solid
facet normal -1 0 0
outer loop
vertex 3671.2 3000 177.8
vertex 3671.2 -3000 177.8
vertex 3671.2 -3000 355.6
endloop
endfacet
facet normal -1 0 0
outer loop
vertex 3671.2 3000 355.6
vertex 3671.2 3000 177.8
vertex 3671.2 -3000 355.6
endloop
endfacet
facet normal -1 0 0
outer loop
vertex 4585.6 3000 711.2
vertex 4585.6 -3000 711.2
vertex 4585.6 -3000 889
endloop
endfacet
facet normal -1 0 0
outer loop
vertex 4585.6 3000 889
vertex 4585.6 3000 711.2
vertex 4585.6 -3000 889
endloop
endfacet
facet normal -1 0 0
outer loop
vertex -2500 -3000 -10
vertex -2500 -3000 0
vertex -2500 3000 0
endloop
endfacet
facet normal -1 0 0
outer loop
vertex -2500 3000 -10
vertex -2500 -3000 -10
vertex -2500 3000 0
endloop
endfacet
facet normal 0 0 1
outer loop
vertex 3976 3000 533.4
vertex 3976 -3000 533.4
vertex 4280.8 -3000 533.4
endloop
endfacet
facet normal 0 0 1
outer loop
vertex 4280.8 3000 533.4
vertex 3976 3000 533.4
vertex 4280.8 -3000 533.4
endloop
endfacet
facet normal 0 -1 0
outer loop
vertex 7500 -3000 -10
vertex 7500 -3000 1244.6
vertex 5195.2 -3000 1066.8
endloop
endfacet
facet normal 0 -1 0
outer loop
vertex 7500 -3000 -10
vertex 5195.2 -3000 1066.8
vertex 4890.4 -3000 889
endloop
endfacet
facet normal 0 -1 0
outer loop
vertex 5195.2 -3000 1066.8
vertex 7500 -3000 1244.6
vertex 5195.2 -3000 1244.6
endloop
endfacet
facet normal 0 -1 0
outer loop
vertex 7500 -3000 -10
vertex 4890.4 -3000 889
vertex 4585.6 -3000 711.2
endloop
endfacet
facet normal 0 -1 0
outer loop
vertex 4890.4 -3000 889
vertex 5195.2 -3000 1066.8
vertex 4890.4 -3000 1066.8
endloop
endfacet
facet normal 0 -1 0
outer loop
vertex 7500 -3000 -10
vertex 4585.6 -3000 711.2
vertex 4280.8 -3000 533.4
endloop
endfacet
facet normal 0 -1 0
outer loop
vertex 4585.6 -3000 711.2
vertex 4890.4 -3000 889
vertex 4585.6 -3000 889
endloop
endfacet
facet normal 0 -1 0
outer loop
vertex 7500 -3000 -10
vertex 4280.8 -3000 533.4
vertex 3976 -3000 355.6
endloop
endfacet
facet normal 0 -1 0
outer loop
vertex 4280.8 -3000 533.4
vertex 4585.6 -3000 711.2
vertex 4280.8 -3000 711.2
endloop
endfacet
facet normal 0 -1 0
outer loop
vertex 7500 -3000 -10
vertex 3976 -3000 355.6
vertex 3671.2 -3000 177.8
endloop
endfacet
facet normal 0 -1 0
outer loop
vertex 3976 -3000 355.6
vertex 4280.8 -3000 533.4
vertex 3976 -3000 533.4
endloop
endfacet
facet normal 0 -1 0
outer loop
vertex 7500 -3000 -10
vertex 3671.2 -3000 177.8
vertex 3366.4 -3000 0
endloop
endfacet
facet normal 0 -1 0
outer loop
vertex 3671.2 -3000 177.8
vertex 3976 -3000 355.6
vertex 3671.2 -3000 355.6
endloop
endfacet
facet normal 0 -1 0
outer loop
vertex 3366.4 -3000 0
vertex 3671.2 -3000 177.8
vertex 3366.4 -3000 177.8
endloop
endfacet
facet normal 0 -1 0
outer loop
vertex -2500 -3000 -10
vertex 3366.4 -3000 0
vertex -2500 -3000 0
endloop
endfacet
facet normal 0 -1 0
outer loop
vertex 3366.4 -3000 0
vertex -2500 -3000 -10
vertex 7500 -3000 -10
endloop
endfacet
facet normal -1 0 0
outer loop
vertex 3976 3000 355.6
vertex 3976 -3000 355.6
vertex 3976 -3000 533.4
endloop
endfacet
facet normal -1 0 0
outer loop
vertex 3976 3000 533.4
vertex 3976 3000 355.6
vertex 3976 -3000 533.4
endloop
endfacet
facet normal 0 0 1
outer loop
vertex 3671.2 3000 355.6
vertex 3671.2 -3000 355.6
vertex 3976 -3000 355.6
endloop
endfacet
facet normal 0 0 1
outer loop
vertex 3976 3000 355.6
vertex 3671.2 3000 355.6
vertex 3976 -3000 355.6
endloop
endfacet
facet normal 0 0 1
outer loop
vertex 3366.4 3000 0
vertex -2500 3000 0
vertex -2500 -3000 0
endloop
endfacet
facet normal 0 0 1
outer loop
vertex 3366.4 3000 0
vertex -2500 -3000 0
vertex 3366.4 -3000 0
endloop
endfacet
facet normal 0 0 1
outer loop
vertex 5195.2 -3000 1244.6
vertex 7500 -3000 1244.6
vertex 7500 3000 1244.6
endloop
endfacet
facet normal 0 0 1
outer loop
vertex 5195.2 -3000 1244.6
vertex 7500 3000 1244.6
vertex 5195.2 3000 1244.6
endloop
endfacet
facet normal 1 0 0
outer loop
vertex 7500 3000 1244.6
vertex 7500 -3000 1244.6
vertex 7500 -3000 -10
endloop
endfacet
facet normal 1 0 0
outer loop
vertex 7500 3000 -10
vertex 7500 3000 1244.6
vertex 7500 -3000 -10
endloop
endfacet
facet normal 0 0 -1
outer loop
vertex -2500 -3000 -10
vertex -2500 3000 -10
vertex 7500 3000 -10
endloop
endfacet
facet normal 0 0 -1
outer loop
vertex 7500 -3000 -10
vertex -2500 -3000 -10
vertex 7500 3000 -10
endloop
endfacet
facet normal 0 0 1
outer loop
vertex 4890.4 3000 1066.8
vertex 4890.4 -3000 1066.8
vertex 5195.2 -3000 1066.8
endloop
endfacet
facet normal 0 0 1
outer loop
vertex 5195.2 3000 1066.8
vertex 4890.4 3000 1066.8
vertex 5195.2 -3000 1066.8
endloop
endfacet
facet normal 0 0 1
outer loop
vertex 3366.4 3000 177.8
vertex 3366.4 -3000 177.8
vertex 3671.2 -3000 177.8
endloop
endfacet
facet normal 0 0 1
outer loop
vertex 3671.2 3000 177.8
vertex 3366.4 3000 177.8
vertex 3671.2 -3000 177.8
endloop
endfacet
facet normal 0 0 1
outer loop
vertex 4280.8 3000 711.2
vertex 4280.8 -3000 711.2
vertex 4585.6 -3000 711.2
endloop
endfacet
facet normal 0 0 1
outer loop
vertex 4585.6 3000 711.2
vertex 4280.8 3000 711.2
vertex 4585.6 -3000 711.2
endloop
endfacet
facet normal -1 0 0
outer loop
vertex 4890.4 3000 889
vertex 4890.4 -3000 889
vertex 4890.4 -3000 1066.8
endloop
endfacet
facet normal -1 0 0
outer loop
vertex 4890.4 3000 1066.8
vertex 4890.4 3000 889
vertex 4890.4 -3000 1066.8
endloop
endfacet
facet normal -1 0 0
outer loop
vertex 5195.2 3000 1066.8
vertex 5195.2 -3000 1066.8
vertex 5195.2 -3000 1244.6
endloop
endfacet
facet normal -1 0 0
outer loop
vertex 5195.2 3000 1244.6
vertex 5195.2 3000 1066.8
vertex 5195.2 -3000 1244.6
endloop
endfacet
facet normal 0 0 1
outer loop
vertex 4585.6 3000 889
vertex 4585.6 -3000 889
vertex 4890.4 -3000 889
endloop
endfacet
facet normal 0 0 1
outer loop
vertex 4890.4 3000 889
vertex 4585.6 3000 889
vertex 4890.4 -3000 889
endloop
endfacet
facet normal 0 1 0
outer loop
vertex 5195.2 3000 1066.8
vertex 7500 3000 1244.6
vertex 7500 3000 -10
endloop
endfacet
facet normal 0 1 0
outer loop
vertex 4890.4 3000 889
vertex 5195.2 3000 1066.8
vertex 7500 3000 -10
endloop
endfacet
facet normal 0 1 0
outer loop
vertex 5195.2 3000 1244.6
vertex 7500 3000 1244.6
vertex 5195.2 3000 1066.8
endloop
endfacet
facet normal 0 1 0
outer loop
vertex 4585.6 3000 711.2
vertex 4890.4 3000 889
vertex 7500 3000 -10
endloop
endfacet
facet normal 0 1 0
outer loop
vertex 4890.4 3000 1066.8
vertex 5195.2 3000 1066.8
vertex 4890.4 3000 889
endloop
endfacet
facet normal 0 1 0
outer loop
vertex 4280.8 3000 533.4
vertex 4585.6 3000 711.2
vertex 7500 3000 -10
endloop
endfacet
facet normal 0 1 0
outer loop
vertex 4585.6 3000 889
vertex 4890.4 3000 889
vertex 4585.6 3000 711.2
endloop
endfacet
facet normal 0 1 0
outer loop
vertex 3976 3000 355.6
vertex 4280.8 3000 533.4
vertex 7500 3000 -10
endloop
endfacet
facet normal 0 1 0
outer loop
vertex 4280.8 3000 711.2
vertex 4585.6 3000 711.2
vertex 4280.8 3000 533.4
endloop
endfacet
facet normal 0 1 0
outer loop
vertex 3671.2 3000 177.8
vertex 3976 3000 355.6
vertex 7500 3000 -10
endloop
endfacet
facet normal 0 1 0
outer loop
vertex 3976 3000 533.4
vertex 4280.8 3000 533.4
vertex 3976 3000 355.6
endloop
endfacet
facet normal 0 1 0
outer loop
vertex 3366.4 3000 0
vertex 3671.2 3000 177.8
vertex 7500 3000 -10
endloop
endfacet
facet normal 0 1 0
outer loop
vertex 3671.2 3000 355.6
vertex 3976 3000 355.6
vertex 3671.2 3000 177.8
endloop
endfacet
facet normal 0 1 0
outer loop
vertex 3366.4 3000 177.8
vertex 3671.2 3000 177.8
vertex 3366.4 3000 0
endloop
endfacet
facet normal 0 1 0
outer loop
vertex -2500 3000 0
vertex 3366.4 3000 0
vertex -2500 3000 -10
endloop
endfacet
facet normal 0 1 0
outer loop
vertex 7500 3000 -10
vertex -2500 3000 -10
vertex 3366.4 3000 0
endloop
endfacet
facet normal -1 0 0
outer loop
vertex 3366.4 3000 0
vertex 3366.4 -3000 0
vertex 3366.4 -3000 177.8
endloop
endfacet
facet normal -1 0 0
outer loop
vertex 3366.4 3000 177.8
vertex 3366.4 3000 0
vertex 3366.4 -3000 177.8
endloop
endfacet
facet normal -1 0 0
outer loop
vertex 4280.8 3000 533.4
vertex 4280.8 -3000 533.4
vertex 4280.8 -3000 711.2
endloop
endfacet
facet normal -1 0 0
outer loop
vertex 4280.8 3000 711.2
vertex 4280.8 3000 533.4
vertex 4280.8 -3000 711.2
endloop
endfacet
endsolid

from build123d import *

# Parameters (mm, degrees)
SKETCH1_W           = 10000
SKETCH1_H           = 6000
BOSS_EXTRUDE1_DEPTH = 10
BOSS_EXTRUDE2_DEPTH = 6000


with BuildPart() as part:
    # Sketch1 → Boss-Extrude1 (new body)
    with BuildSketch(Plane.XY):
        with Locations((2500, 0)):
            Rectangle(SKETCH1_W, SKETCH1_H)
    extrude(amount=-BOSS_EXTRUDE1_DEPTH)

    # Sketch2 → Boss-Extrude2 (add)
    with BuildSketch(Plane.XZ.offset(3000)):
        Polygon((3366.4, 0), (3366.4, 177.8), (3671.2, 177.8), (3671.2, 355.6), (3976, 355.6), (3976, 533.4), (4280.8, 533.4), (4280.8, 711.2), (4585.6, 711.2), (4585.6, 889), (4890.4, 889), (4890.4, 1066.8), (5195.2, 1066.8), (5195.2, 1244.6), (5500, 1244.6), (7500, 1244.6), (7500, 0), align=None)
    extrude(amount=-BOSS_EXTRUDE2_DEPTH)


solid = part.part
